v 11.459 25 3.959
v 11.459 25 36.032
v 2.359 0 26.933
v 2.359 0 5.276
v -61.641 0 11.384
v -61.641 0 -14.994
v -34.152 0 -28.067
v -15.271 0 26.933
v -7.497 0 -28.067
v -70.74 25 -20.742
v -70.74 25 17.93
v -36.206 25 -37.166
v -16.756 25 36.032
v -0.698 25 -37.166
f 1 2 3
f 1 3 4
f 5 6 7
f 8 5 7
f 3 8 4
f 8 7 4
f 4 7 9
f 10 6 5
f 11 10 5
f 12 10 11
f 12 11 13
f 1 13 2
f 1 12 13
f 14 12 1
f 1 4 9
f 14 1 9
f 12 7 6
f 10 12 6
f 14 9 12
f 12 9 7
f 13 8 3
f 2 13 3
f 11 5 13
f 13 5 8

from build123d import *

# Parameters (mm, degrees)
EXTRUDE_1_DEPTH = 25
DRAFT_1_ANGLE   = 20


with BuildPart() as part:
    # 草图1 → 凸台-拉伸1 (new body)
    with BuildSketch(Plane(origin=(0, 0, 0), x_dir=(1, 0, 0), z_dir=(0, 1, 0))):
        Polygon((-61.640527642, 14.993641859), (-61.640527642, -11.384061411), (-15.271301893, -26.933023339), (2.359472358, -26.933023339), (2.359472358, -5.275540654), (-7.496820929, 28.066976661), (-34.152184234, 28.066976661), align=None)
    extrude(amount=EXTRUDE_1_DEPTH)

    # 拔模1
    draft_1_faces = [part.faces().sort_by_distance(p)[0] for p in [
        (-38.455914768, 12.5, 19.158542375),
        (-61.640527642, 12.5, -1.804790224),
        (-47.896355938, 12.5, -21.53030926),
        (-20.824502582, 12.5, -28.066976661),
        (-2.568674286, 12.5, -11.395718003),
        (2.359472358, 12.5, 16.104281997),
        (-6.455914768, 12.5, 26.933023339),
    ]]
    draft(draft_1_faces, Plane(origin=(0, 0, 0), x_dir=(0, 0, -1), z_dir=(0, -1, 0)), DRAFT_1_ANGLE)


solid = part.part
